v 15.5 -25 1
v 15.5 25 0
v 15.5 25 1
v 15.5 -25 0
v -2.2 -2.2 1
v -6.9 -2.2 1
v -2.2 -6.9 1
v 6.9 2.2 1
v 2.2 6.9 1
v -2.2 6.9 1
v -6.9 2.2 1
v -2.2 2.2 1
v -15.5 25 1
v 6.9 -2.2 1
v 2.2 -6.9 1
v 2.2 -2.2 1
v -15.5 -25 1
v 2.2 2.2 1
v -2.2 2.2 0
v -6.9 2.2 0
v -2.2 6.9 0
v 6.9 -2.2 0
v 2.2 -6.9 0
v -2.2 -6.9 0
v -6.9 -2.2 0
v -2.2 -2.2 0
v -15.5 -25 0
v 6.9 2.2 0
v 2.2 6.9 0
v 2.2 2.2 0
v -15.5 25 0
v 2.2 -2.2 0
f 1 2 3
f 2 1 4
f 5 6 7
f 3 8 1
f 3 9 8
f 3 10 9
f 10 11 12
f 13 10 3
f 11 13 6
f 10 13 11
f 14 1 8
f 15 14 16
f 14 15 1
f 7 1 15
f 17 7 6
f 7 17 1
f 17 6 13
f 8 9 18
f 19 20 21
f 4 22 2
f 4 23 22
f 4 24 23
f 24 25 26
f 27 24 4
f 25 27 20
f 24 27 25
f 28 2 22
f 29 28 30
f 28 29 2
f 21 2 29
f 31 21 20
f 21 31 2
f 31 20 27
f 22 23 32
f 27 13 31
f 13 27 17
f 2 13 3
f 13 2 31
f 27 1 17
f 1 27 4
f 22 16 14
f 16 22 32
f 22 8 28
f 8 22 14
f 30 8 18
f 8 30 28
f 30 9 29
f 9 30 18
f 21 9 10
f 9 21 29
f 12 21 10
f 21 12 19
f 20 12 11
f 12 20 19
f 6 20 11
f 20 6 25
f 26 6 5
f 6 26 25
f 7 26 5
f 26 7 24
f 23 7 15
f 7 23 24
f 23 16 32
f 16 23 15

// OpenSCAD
cross_size = 13.4;
cs2 = cross_size / 2;
cross_width = 4;
cw2 = cross_width / 2; 
cross_height = 0.9;

holder_thick = 0.5;
holder_height = 3.2;

plate_width = 31;
plate_height = 50;
plate_thick = holder_height;

plate_adjust_thick = 0.8;

module cross_holder() {
	width = 1;
	width2 = width / 2;
	rotate([90, 0, 0]) {
		linear_extrude(height = holder_thick, center = true) {
			polygon([[-width2, 0], [width2, 0], [0, holder_height]]);
		}
	}		
}

module cross_shape(correction) {
	c = correction; 
	
	polygon([
		[-cw2 - c, -cs2 - c], [cw2 + c, -cs2 - c], [cw2 + c, -cw2 - c], [cs2 + c, -cw2 - c],
		[cs2 + c, cw2 + c], [cw2 + c, cw2 + c], [cw2 + c, cs2 + c], [-cw2 - c, cs2 + c],
		[-cw2 - c, cw2 + c], [-cs2 - c, cw2 + c], [-cs2 - c, -cw2 - c], [-cw2 - c, -cw2 - c]
	]);
}

module cross() {
	color("silver") {
		union() {
			linear_extrude(height = cross_height, center = false) {
				cross_shape(0);
			};
			translate([0, cs2 - holder_thick / 2, cross_height]) {
				cross_holder();
			};
			translate([0, -cs2 + holder_thick / 2, cross_height]) {
				cross_holder();
			};
		}
	}
};

module plate_adjust() {
	cube([plate_width, plate_adjust_thick, plate_thick + cross_height + 2]);
}

module plate() {
	color("red") {
		union() {
			difference() {
				translate([-plate_width / 2, -plate_height / 2, 0]) {
					cube([plate_width, plate_height, plate_thick + cross_height]);
				};
				linear_extrude(height = plate_thick + cross_height + 0.1, center = false) {
					cross_shape(0.2);
				};
			}
			translate([-plate_width / 2, -(plate_height / 2) - plate_adjust_thick, 0]) {
				plate_adjust();
			}
			translate([-plate_width / 2, (plate_height / 2), 0]) {
				plate_adjust();
			}
		}
	}
}

module plate_simple() {
	color("red") {
		union() {
			difference() {
				translate([-plate_width / 2, -plate_height / 2, 0]) {
					cube([plate_width, plate_height, 0.1 + cross_height]);
				};
				linear_extrude(height = plate_thick + cross_height + 0.1, center = false) {
					cross_shape(0.2);
				};
			}
		}
	}
}

module stamp() {
	stamp_height = 3;
	color("green") {
		union() {
			cube([plate_width, plate_width, stamp_height], center = true); 

			translate([0, 0, stamp_height / 2]) {			
				linear_extrude(height = holder_height + 2, center = false) {
					cross_shape(-0.2);
				};
			}
		}	
	}
}

*cross();

*plate();

plate_simple();

*cross_holder();

*stamp();
